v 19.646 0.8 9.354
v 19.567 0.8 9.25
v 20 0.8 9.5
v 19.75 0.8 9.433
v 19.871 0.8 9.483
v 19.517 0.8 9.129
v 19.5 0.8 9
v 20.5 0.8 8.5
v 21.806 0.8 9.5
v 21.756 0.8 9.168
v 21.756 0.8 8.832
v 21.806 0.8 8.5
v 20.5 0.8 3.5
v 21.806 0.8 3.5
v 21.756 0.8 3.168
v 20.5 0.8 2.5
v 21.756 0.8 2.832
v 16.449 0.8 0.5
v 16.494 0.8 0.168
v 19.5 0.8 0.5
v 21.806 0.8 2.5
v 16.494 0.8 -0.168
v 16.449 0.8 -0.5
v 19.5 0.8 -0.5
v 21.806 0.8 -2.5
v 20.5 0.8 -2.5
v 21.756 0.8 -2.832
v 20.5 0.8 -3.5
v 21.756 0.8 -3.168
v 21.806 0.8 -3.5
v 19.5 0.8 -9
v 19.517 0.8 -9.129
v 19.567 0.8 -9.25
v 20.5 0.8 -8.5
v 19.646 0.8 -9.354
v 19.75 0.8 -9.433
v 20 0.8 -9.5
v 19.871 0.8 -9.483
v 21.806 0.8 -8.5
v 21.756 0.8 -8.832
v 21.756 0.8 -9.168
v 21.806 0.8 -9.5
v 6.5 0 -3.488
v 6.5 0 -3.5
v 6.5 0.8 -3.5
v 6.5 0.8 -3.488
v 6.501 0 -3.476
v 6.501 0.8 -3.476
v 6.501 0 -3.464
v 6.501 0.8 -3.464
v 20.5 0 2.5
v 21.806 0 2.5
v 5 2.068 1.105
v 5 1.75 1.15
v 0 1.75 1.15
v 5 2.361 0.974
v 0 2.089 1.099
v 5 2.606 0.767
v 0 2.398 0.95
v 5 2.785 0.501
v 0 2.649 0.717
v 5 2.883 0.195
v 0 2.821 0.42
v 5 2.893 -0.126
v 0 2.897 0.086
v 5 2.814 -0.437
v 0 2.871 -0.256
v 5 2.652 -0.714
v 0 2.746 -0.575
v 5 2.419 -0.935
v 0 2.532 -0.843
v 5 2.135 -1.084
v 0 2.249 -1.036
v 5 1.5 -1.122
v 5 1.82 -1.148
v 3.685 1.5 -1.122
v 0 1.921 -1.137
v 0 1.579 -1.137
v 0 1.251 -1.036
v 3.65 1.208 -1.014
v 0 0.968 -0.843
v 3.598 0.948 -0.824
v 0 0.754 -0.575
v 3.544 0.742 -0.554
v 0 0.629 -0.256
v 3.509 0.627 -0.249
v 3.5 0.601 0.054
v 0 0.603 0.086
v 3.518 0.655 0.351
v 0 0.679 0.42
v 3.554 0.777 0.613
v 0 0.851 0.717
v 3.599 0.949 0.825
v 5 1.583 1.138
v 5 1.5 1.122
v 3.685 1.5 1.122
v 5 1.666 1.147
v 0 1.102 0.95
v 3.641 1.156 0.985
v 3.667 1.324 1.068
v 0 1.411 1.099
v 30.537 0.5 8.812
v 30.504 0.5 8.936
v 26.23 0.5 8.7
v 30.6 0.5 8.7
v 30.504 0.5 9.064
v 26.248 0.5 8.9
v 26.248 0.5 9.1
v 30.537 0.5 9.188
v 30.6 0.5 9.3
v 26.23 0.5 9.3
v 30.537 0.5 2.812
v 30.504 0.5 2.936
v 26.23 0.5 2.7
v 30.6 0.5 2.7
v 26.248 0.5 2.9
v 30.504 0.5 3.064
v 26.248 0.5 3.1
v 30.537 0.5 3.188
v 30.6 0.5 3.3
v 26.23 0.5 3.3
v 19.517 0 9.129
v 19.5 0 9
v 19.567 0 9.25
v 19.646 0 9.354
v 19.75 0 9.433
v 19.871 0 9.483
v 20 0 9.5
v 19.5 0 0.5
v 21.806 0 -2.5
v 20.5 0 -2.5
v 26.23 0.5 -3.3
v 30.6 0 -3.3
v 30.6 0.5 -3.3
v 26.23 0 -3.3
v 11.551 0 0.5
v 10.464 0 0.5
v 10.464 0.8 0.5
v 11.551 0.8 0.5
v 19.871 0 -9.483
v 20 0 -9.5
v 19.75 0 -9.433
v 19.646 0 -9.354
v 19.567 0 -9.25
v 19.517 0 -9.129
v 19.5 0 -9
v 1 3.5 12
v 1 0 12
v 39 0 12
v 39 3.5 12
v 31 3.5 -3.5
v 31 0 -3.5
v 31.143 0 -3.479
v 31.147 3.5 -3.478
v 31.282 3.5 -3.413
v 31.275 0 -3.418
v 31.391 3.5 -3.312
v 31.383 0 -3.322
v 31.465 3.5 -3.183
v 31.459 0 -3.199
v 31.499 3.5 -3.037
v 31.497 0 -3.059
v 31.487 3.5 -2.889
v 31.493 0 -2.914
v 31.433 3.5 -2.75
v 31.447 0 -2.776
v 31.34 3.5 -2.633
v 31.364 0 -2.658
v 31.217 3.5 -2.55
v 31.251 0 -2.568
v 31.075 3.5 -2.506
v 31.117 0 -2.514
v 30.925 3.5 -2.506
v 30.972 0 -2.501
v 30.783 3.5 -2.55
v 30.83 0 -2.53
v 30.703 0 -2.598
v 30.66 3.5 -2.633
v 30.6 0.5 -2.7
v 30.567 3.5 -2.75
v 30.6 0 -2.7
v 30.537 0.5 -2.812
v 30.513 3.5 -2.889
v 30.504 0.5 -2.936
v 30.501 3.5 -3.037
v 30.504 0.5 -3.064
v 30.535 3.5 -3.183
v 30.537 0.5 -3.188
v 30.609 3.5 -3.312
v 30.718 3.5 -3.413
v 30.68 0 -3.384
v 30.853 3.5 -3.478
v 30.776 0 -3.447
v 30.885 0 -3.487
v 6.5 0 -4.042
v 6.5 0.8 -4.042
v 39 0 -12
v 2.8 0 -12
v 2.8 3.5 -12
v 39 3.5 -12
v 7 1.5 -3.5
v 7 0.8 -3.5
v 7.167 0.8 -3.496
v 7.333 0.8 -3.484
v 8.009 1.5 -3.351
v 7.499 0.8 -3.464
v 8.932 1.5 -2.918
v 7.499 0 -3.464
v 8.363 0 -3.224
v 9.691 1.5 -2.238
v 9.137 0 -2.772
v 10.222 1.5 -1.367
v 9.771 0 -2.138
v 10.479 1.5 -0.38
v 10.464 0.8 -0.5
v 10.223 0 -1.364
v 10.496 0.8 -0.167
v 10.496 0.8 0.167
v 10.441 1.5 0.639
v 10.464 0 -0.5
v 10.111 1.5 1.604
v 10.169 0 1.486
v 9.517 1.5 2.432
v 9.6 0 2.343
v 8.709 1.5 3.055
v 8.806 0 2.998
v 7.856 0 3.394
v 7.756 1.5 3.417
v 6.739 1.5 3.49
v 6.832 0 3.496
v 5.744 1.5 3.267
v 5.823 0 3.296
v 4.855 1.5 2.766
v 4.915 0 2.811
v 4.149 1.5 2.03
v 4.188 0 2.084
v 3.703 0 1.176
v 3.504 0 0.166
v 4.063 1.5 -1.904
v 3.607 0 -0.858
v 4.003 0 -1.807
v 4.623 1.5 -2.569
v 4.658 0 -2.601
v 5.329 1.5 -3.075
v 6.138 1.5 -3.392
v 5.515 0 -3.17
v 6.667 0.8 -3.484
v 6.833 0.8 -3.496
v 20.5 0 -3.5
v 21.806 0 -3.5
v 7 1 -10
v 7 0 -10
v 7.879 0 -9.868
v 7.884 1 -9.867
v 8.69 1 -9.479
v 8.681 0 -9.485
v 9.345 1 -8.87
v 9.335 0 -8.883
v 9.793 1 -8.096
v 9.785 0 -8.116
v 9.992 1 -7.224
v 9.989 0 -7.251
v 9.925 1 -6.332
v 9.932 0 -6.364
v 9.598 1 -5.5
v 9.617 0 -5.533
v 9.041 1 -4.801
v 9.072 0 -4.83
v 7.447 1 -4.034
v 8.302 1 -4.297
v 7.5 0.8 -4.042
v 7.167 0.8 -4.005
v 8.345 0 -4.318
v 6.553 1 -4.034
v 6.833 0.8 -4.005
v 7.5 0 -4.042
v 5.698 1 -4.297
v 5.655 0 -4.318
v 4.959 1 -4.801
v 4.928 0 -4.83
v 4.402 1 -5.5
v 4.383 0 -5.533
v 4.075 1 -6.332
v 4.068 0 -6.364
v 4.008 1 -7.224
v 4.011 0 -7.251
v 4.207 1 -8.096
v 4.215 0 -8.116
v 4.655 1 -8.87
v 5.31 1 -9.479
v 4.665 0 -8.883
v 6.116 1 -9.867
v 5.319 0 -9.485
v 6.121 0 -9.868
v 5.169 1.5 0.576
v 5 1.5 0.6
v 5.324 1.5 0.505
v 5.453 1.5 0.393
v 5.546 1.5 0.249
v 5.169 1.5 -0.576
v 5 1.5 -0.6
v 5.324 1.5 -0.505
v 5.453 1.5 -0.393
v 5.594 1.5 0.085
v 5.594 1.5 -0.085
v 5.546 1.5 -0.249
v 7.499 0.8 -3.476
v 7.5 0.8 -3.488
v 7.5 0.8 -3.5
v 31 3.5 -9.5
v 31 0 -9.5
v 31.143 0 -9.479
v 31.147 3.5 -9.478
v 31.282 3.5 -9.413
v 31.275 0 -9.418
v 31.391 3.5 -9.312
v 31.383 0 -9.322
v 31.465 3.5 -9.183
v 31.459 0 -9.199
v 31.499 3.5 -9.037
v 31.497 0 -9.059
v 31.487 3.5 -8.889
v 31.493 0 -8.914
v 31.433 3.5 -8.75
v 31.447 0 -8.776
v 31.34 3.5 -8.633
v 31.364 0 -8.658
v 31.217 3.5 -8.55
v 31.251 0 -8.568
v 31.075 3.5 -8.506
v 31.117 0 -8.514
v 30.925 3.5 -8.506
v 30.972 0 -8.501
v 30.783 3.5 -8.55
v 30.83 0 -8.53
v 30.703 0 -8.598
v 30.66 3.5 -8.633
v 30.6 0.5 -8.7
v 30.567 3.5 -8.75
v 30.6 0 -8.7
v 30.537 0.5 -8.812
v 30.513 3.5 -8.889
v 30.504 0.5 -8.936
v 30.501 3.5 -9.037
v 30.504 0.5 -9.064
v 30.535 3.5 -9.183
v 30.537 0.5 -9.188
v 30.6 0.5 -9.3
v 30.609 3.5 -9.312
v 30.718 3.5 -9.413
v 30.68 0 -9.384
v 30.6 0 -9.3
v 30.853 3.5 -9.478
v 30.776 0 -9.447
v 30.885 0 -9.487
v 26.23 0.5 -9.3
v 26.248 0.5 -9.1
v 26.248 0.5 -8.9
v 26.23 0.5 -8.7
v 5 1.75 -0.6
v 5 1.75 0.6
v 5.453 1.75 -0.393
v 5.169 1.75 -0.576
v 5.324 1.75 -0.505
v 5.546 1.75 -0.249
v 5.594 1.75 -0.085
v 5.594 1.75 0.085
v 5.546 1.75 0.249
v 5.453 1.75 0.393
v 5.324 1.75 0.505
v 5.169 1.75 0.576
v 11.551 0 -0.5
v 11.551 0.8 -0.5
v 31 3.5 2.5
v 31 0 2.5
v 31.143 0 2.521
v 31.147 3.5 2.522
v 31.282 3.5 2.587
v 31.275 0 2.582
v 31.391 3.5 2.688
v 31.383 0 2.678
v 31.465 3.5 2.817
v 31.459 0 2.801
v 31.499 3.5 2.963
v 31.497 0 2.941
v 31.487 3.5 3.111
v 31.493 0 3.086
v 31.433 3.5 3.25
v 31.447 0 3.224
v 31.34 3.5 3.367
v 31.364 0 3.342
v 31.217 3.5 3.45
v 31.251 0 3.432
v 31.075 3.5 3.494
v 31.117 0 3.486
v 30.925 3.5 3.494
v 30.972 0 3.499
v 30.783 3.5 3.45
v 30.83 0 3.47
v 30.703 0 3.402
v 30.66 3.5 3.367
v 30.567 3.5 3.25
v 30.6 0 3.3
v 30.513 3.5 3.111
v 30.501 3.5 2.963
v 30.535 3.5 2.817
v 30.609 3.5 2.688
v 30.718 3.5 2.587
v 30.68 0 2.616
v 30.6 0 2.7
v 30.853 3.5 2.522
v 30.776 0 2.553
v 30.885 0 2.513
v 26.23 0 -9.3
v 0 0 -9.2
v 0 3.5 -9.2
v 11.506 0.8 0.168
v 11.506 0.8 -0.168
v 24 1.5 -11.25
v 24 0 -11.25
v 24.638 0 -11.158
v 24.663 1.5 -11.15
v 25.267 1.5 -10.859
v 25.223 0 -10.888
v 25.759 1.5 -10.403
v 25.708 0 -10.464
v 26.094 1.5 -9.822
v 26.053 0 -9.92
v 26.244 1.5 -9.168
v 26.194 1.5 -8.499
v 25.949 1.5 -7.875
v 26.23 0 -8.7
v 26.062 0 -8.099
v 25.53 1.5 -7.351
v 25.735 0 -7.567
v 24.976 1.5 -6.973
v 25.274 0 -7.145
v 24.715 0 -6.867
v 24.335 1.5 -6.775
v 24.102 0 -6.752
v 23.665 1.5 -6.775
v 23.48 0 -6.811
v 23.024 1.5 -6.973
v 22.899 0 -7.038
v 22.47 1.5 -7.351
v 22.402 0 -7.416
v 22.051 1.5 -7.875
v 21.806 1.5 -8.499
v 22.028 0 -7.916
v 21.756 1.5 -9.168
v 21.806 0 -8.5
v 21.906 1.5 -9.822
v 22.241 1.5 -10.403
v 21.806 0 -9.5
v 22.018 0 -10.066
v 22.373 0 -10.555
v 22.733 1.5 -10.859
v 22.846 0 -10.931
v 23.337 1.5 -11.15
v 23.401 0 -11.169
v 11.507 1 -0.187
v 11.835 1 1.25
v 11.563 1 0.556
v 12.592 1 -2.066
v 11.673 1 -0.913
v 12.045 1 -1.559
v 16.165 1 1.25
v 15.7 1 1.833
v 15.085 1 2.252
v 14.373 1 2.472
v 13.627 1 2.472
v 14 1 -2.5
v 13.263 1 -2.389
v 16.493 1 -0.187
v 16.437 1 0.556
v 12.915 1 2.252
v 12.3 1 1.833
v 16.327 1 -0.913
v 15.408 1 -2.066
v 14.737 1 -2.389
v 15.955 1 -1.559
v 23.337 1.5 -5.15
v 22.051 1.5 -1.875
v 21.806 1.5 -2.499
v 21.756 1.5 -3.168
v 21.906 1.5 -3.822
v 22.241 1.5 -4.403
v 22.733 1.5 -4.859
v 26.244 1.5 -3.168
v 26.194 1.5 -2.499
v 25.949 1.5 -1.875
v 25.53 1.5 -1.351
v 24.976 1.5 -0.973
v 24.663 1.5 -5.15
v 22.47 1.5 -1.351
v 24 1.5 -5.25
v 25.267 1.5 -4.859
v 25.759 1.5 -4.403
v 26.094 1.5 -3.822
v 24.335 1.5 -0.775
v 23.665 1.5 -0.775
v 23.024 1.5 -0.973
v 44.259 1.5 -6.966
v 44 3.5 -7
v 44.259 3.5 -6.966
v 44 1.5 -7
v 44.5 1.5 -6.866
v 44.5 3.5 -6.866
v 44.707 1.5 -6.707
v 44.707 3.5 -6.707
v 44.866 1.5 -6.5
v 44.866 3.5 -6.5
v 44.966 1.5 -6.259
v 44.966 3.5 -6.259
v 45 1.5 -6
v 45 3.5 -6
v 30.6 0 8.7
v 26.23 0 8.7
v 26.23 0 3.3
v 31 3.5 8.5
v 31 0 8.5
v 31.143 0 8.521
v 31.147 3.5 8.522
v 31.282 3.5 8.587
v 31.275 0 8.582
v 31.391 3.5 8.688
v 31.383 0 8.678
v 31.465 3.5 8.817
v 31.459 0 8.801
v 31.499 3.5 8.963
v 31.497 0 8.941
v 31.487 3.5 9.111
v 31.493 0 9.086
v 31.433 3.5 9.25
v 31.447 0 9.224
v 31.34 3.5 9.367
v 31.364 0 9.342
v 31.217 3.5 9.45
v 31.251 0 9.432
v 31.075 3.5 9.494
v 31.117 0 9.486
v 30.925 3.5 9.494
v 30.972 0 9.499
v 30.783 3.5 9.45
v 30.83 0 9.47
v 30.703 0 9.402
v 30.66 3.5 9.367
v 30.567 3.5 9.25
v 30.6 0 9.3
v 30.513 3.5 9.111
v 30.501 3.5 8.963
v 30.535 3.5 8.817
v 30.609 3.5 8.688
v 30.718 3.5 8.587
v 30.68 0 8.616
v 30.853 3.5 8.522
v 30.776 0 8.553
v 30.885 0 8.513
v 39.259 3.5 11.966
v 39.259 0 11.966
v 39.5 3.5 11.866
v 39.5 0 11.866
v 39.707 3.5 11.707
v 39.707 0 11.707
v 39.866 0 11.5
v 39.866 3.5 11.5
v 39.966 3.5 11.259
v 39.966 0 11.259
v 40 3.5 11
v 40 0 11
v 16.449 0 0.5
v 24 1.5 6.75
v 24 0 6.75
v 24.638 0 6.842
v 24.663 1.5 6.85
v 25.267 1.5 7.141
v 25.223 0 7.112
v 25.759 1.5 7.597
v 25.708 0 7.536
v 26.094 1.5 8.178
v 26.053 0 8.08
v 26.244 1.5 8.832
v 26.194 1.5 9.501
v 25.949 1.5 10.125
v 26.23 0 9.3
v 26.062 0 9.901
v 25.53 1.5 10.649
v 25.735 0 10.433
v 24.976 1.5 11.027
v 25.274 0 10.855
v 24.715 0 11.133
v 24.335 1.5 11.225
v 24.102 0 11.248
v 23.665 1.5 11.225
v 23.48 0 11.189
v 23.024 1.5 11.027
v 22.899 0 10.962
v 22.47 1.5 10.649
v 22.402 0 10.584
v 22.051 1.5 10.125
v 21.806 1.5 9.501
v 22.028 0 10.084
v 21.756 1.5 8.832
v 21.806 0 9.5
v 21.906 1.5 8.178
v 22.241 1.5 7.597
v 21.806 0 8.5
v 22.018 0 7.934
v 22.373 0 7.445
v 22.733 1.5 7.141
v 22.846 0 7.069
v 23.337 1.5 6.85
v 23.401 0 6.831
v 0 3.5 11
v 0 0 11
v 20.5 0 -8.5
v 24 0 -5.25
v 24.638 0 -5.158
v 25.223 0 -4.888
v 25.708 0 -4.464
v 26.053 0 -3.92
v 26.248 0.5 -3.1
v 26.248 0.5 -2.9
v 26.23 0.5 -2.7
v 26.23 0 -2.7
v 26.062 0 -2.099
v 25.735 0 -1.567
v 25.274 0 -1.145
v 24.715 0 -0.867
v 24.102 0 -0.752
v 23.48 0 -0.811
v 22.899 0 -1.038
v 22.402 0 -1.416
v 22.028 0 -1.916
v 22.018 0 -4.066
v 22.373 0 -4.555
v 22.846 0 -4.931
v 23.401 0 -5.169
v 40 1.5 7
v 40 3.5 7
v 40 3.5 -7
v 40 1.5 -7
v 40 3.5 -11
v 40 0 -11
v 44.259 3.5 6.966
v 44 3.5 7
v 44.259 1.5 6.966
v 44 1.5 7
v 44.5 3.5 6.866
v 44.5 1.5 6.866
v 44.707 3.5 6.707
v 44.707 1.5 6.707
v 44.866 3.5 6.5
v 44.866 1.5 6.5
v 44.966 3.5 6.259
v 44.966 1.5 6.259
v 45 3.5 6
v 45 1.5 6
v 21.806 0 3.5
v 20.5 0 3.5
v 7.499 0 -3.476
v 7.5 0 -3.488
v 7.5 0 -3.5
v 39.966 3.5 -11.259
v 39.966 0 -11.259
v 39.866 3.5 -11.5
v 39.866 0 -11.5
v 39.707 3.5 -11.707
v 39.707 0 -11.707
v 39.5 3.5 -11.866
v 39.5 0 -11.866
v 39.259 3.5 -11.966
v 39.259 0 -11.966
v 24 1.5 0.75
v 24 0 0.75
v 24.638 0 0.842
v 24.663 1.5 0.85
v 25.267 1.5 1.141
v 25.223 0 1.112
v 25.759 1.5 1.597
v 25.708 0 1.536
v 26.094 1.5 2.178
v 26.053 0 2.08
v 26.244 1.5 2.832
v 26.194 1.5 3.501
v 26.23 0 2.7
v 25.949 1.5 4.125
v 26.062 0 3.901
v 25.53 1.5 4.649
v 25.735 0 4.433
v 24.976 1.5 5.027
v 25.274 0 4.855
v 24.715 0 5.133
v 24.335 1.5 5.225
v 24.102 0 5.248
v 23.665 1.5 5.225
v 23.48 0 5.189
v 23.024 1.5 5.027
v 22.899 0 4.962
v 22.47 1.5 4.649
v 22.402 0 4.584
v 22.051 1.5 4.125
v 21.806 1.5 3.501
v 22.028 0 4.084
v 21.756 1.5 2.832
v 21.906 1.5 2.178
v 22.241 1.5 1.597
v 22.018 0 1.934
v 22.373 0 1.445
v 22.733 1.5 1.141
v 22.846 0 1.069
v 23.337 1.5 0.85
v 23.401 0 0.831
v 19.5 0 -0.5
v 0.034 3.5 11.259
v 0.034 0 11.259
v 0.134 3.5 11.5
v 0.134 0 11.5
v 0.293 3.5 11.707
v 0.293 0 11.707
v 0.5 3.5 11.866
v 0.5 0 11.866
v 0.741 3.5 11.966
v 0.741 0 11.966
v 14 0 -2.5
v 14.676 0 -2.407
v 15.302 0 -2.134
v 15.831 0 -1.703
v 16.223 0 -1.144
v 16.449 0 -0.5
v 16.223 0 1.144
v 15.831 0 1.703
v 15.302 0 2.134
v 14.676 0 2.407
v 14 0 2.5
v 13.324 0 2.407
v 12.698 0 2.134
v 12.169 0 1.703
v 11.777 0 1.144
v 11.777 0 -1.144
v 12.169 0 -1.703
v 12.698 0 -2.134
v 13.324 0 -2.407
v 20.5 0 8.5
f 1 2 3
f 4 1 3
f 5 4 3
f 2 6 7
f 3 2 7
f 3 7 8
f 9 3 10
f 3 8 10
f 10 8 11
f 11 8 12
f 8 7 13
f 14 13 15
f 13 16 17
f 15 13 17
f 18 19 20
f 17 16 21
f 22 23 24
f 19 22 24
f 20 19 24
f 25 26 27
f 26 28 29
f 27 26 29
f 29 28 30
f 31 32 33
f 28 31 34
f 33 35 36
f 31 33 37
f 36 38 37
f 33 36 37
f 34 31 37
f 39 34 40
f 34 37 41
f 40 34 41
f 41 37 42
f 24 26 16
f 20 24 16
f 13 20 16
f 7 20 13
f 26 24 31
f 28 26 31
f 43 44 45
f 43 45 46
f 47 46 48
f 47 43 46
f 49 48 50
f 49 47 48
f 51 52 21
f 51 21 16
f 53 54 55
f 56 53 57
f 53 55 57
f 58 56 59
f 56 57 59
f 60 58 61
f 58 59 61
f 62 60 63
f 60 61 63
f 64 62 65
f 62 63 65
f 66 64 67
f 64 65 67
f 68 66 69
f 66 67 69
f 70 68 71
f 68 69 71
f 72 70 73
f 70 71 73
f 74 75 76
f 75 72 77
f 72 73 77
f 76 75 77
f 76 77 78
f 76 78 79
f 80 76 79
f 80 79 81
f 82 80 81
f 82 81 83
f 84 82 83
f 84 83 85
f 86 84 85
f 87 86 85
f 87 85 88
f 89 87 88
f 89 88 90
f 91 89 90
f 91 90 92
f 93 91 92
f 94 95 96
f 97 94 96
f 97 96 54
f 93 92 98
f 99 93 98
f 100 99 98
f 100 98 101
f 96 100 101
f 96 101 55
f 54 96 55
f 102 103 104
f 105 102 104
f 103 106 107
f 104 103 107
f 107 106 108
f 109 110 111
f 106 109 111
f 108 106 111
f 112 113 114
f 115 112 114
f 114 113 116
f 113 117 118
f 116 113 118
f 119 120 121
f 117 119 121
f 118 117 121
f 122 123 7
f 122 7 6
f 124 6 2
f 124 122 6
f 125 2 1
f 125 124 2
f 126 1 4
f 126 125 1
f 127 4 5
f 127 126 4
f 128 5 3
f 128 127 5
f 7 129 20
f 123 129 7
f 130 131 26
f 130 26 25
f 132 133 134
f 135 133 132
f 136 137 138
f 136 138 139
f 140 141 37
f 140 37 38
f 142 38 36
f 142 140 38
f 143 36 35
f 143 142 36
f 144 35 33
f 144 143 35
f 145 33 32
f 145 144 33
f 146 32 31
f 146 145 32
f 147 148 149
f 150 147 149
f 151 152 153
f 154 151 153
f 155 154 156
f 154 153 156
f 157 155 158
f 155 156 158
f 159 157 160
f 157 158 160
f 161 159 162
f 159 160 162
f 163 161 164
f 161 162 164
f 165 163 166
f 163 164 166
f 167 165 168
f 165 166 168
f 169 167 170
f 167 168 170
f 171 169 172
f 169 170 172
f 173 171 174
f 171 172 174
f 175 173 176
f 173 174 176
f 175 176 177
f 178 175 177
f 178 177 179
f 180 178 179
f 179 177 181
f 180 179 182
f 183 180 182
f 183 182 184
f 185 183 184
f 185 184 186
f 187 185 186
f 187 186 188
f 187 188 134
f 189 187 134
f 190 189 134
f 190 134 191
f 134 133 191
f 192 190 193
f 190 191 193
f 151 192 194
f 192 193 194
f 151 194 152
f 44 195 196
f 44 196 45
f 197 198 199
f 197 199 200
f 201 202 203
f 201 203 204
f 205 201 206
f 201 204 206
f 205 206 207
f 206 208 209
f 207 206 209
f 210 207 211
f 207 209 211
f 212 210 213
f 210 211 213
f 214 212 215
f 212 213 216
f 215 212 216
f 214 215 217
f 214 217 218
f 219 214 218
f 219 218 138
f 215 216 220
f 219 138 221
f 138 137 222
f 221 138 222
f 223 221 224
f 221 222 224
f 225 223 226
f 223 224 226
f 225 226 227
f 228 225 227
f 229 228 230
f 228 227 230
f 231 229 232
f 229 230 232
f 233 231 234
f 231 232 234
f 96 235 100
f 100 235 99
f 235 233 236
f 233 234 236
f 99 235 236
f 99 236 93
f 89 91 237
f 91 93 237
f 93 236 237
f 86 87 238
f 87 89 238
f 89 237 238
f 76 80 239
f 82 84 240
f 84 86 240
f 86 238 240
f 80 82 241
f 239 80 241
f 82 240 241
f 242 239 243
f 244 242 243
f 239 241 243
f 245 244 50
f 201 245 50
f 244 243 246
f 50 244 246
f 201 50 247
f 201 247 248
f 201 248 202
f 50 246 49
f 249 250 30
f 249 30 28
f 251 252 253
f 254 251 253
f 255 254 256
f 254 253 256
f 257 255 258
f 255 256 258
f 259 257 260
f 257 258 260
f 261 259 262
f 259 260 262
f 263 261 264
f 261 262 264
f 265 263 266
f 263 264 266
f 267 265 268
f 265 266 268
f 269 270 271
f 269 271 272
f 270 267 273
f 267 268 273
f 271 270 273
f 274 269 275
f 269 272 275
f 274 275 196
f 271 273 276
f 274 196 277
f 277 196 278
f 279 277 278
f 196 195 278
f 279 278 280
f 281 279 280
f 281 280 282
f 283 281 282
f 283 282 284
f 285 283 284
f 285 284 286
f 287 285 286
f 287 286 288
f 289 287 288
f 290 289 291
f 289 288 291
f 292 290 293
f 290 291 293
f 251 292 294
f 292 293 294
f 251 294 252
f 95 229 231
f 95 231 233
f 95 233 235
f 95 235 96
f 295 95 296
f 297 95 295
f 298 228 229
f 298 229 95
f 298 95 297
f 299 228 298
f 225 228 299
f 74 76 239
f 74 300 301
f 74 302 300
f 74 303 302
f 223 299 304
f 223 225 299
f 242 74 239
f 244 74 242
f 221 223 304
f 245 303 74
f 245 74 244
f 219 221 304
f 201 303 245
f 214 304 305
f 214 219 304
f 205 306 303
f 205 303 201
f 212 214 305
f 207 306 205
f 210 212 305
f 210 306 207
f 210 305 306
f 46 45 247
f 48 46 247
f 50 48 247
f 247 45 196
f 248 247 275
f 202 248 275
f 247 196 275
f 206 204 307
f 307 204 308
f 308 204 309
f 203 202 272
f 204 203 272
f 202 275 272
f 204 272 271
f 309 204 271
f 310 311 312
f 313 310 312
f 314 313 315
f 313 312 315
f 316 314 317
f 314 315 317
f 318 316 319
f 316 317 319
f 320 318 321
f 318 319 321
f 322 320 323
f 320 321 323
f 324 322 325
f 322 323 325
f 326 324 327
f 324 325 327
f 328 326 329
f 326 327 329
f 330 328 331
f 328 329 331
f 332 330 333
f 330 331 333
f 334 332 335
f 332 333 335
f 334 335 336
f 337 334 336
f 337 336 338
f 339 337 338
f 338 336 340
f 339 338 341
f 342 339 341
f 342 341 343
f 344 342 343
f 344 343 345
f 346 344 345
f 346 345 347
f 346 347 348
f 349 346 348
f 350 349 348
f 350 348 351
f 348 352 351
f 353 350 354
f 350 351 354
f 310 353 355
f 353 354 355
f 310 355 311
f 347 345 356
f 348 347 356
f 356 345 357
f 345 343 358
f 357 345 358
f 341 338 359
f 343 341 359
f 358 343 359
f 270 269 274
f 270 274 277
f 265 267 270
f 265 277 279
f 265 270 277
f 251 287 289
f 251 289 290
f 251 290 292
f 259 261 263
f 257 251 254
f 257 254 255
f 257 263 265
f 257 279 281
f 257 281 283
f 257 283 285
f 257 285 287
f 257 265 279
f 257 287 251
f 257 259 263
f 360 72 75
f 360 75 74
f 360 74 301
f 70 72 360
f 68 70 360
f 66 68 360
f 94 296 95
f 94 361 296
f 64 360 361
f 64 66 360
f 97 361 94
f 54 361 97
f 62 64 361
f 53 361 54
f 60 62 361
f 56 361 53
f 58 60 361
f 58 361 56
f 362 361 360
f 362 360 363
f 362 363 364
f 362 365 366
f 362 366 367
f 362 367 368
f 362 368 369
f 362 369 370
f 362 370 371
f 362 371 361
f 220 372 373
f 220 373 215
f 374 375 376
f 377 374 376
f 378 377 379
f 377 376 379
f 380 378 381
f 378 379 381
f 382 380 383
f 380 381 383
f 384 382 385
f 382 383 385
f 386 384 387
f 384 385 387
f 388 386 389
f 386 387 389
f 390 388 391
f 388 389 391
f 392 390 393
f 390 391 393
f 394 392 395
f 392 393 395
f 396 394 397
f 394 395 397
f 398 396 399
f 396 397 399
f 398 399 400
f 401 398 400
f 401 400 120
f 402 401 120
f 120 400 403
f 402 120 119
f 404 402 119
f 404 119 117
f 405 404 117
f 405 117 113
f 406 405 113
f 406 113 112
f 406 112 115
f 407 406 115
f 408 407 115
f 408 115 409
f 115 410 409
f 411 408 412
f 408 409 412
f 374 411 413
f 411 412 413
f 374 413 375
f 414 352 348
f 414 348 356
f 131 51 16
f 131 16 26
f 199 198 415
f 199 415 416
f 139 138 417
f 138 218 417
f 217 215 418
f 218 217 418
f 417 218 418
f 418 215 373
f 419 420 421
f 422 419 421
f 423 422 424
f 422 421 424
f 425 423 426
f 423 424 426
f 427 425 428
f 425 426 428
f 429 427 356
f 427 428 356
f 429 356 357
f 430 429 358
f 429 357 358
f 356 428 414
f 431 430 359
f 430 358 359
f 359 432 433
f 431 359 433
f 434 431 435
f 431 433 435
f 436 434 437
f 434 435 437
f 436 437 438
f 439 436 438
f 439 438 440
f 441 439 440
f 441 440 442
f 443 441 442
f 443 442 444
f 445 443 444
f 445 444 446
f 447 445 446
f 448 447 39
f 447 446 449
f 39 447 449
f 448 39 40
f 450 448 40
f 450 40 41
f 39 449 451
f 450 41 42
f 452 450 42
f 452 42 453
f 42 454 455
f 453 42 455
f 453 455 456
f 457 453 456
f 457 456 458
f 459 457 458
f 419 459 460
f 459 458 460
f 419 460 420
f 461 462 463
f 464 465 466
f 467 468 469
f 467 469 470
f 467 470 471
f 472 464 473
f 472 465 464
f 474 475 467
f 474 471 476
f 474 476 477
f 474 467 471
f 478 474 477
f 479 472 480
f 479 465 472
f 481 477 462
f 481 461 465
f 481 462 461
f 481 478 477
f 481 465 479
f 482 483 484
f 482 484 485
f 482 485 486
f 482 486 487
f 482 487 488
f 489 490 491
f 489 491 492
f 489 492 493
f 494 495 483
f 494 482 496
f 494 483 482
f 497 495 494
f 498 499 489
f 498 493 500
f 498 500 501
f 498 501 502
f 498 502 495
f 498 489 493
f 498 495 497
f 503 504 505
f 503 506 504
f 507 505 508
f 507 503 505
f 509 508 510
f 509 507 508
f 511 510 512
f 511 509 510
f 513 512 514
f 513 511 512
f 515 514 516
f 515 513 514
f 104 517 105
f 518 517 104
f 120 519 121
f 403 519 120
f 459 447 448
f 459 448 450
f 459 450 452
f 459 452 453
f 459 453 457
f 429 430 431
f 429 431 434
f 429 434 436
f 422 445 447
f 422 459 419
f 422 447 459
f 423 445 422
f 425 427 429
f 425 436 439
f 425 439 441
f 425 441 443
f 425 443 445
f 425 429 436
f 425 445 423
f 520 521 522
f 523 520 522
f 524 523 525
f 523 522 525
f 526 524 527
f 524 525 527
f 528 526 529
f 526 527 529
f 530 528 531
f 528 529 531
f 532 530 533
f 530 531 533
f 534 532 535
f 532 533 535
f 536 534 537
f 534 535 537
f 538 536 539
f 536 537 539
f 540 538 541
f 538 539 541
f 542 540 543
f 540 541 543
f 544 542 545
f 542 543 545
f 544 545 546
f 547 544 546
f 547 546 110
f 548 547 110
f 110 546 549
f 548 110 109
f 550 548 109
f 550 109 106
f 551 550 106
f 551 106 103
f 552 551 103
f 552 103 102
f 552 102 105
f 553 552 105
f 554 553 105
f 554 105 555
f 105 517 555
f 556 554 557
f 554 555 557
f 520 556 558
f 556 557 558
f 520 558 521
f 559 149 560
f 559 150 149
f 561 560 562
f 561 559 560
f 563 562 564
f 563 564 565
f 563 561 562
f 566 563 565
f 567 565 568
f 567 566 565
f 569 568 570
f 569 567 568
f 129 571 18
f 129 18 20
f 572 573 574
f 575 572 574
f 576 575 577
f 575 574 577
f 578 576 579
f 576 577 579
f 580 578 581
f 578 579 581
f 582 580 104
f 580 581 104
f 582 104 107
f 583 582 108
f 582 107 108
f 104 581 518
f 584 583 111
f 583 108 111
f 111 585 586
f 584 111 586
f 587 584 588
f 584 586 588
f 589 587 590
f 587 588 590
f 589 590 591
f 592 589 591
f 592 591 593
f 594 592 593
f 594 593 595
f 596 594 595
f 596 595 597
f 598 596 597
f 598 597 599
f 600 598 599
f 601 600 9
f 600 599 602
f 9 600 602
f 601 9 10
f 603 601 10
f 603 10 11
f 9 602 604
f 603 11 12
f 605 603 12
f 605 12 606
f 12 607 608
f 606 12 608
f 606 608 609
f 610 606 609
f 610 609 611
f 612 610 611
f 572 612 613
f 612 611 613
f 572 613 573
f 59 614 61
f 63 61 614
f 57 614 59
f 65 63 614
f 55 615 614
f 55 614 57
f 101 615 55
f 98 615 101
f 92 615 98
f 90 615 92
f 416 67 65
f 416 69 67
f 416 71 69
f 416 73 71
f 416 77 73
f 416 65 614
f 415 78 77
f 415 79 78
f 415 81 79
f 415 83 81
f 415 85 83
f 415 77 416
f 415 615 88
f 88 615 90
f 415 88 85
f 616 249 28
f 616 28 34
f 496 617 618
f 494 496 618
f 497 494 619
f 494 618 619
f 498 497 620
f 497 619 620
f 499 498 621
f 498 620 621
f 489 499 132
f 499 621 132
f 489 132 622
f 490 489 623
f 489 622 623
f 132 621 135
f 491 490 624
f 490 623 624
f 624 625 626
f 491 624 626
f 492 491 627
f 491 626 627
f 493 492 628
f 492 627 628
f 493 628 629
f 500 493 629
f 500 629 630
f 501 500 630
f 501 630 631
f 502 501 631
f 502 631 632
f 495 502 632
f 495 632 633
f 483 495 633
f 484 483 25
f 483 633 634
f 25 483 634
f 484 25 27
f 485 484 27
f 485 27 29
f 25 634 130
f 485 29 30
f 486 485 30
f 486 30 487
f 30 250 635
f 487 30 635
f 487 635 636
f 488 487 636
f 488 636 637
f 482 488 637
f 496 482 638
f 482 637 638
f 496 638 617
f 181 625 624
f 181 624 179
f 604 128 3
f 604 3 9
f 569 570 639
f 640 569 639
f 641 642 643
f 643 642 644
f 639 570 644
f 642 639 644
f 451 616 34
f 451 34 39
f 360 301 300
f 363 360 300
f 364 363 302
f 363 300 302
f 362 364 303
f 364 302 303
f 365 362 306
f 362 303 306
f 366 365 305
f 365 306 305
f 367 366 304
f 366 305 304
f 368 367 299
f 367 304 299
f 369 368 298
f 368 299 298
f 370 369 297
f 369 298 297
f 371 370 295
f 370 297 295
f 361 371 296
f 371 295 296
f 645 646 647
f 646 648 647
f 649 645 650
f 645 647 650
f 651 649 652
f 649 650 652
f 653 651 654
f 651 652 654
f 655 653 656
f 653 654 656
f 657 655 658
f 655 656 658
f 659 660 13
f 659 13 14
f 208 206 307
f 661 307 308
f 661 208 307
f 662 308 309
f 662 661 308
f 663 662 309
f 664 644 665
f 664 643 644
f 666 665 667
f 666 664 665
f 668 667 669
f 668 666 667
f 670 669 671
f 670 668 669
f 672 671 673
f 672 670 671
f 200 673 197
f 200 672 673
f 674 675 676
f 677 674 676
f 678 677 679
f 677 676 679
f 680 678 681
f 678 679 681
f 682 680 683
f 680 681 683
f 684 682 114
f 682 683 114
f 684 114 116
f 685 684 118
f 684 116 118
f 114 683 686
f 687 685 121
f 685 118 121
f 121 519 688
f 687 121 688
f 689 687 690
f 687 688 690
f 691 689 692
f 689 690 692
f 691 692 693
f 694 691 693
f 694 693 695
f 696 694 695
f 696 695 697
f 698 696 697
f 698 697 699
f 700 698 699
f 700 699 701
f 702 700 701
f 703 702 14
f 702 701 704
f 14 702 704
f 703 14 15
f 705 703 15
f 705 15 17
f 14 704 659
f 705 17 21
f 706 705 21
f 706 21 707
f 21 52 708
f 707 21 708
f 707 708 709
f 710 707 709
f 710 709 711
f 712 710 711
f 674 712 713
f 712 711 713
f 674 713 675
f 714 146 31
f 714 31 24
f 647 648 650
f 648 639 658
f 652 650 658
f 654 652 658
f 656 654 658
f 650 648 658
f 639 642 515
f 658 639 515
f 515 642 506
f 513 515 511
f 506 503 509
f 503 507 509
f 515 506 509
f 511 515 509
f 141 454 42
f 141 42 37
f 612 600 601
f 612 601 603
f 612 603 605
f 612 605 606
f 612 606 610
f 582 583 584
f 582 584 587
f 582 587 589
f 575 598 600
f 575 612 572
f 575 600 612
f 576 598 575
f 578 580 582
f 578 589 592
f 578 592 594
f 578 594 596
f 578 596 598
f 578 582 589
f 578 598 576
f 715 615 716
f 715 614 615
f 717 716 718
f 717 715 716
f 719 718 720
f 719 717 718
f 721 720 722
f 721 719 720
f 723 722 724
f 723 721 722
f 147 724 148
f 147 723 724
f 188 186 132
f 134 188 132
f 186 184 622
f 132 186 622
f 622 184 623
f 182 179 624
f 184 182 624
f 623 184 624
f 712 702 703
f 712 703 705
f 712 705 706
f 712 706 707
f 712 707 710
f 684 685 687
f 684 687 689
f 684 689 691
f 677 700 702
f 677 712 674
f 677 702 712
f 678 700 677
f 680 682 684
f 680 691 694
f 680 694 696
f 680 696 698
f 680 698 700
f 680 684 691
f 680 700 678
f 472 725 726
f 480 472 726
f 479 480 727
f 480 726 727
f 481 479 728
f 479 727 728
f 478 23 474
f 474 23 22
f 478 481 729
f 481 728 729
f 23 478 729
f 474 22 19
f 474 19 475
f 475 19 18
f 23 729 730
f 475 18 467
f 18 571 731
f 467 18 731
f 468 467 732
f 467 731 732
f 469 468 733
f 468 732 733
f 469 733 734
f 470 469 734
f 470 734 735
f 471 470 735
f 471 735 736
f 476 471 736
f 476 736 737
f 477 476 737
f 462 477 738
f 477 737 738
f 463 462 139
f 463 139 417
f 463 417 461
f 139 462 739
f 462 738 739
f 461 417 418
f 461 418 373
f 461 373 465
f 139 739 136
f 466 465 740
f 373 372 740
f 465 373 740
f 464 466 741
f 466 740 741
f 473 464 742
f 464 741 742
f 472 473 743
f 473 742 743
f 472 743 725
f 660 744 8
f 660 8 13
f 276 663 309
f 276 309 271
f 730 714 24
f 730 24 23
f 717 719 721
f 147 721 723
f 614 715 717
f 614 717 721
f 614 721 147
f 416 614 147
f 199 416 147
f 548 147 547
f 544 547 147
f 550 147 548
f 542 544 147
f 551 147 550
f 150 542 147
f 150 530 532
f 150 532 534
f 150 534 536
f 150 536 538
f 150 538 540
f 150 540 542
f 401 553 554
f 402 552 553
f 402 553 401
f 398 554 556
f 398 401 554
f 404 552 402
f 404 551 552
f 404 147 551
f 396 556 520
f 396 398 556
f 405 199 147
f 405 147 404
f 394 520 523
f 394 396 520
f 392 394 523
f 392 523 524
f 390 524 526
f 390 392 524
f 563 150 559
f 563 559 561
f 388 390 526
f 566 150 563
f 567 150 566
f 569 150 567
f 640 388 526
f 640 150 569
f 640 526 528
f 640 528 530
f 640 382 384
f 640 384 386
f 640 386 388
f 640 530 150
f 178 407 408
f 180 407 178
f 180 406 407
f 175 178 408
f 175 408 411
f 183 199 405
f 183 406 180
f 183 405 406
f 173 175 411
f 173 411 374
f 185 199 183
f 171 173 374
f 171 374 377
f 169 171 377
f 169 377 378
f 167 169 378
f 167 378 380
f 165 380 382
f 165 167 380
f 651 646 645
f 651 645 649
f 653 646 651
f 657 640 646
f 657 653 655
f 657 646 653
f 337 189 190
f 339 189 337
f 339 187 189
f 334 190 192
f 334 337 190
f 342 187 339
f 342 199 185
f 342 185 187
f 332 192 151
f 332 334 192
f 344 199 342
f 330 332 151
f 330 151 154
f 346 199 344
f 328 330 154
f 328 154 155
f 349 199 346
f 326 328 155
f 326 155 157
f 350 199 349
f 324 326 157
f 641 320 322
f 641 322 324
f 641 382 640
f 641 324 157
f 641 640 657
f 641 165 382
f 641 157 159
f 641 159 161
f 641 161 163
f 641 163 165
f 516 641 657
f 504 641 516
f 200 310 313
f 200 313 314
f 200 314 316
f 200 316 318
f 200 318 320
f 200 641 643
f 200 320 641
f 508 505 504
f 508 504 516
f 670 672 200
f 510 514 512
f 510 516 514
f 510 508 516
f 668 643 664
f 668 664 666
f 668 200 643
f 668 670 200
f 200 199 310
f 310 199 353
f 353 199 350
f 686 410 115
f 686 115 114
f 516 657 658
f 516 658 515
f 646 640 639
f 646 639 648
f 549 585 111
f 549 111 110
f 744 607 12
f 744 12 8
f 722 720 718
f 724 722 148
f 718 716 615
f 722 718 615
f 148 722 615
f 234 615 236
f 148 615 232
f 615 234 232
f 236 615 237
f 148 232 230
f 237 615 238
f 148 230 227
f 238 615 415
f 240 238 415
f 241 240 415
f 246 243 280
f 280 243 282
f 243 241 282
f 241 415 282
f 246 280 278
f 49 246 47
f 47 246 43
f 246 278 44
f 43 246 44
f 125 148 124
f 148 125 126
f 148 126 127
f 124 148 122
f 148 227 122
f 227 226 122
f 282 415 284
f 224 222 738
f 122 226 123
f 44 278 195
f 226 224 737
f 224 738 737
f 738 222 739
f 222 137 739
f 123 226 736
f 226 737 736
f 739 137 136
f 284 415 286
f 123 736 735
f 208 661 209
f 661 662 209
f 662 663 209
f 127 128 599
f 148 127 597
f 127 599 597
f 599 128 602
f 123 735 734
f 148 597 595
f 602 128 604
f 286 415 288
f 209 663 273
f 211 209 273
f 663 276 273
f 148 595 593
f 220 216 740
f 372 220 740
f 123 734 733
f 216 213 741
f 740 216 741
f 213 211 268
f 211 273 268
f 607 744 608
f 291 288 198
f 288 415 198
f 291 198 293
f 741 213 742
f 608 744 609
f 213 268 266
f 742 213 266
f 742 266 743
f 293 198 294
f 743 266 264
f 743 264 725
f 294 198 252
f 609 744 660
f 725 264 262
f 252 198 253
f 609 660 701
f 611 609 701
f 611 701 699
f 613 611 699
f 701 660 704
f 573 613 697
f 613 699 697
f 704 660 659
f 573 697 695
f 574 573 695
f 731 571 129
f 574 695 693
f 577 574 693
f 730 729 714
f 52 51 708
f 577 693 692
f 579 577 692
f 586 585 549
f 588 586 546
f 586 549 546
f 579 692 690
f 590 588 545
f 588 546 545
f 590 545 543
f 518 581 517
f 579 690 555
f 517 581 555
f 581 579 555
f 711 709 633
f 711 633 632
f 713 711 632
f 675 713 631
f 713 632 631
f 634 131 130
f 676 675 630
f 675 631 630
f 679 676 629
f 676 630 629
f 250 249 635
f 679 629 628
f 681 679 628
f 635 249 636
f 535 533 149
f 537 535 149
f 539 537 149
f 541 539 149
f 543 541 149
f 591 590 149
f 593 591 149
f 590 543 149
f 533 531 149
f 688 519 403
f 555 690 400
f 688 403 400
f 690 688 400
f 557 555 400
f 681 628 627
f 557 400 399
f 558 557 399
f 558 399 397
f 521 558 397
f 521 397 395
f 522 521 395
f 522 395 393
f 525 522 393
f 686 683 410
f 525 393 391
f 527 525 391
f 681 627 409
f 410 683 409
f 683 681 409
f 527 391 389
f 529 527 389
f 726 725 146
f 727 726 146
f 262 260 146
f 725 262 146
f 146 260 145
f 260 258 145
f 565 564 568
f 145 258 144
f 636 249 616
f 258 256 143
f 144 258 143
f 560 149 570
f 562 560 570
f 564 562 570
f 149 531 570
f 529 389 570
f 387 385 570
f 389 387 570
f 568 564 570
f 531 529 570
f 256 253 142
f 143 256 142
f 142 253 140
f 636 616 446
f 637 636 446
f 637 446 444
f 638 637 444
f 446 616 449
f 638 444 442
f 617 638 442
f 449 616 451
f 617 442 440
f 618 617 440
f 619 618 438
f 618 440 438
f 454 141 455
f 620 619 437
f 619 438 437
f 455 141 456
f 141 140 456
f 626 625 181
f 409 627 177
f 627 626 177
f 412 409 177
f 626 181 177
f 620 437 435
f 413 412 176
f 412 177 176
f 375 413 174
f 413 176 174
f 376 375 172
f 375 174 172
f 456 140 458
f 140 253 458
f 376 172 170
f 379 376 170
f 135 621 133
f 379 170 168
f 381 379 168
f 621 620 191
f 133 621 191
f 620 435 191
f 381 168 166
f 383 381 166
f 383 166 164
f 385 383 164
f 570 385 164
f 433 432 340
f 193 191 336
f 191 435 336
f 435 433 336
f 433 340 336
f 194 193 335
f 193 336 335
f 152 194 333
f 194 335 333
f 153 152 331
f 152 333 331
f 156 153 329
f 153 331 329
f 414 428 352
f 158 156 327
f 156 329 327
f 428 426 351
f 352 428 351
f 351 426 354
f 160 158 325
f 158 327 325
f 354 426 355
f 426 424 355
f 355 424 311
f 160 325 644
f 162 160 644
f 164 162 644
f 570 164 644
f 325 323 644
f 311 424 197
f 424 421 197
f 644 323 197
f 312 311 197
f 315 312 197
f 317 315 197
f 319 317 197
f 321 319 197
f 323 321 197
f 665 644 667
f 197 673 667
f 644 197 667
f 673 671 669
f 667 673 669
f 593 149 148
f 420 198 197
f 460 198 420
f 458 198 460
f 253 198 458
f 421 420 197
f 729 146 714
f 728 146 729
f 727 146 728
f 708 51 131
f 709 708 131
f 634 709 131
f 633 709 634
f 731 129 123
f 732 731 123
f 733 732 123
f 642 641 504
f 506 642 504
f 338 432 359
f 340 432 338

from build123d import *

# Parameters (mm, degrees)
SKETCH4_W           = 40
SKETCH4_H           = 24
BOSS_EXTRUDE2_DEPTH = 3.5
FILLET2_R           = 1
SKETCH5_W           = 4.999999906
SKETCH5_H           = 14
BOSS_EXTRUDE3_DEPTH = 2
FILLET3_R           = 1
CHAMFER1_SIZE       = 2.8
SKETCH6_R           = 1.15
CUT_EXTRUDE1_DEPTH  = 5
SKETCH8_R           = 0.6
CUT_EXTRUDE2_DEPTH  = 1.75
SKETCH9_R           = 3.5
CUT_EXTRUDE3_DEPTH  = 1.5
SKETCH10_R          = 3
CUT_EXTRUDE4_DEPTH  = 1
CUT_EXTRUDE5_DEPTH  = 0.8
SKETCH12_R          = 2.5
CUT_EXTRUDE6_DEPTH  = 1
CUT_EXTRUDE7_DEPTH  = 0.8
CUT_EXTRUDE8_DEPTH  = 0.8
SKETCH16_R          = 2.25
CUT_EXTRUDE9_DEPTH  = 1.5
CUT_EXTRUDE10_DEPTH = 0.5
SKETCH18_R          = 0.5
CUT_EXTRUDE11_DEPTH = 47.70385414
LPATTERN3_COUNT     = 4
LPATTERN3_PITCH     = 6


with BuildPart() as part:
    # Sketch4 → Boss-Extrude2 (new body)
    with BuildSketch(Plane(origin=(0, 0, 0), x_dir=(1, 0, 0), z_dir=(0, 1, 0))):
        with Locations((20, 0)):
            Rectangle(SKETCH4_W, SKETCH4_H)
    extrude(amount=BOSS_EXTRUDE2_DEPTH)

    # Fillet2
    fillet2_edges = [part.edges().sort_by_distance(p)[0] for p in [
        (40, 1.75, -12),
        (40, 1.75, 12),
        (0, 1.75, 12),
    ]]
    fillet(fillet2_edges, radius=FILLET2_R)

    # Sketch5 → Boss-Extrude3 (add)
    with BuildSketch(Plane(origin=(0, 3.5, 0), x_dir=(1, 0, 0), z_dir=(0, 1, 0))):
        with Locations((42.499999953, 0)):
            Rectangle(SKETCH5_W, SKETCH5_H)
    extrude(amount=-BOSS_EXTRUDE3_DEPTH)

    # Fillet3
    fillet3_edges = [part.edges().sort_by_distance(p)[0] for p in [
        (44.999999906, 2.5, -7),
        (44.999999906, 2.5, 7),
    ]]
    fillet(fillet3_edges, radius=FILLET3_R)

    # Chamfer1
    chamfer1_edges = [part.edges().sort_by_distance(p)[0] for p in [
        (0, 1.75, -12),
    ]]
    chamfer(chamfer1_edges, length=CHAMFER1_SIZE)

    # Sketch6 → Cut-Extrude1 (cut)
    with BuildSketch(Plane.ZY):
        with Locations((0, 1.75)):
            Circle(SKETCH6_R)
    extrude(amount=-CUT_EXTRUDE1_DEPTH, mode=Mode.SUBTRACT)

    # Sketch8 → Cut-Extrude2 (cut)
    with BuildSketch(Plane.XZ):
        with Locations(Location((5, 0, 0), (0, 0, 270))):
            Circle(SKETCH8_R)
    extrude(amount=-CUT_EXTRUDE2_DEPTH, mode=Mode.SUBTRACT)

    # Sketch9 → Cut-Extrude3 (cut)
    with BuildSketch(Plane.XZ):
        with Locations(Location((7, 0, 0), (0, 0, 270))):
            Circle(SKETCH9_R)
    extrude(amount=-CUT_EXTRUDE3_DEPTH, mode=Mode.SUBTRACT)

    # Sketch10 → Cut-Extrude4 (cut)
    with BuildSketch(Plane.XZ):
        with Locations(Location((7, -7, 0), (0, 0, 270))):
            Circle(SKETCH10_R)
    extrude(amount=-CUT_EXTRUDE4_DEPTH, mode=Mode.SUBTRACT)

    # Sketch11 → Cut-Extrude5 (cut)
    with BuildSketch(Plane(origin=(0, 0, 0), x_dir=(-1, 0, 0), z_dir=(0, -1, 0))):
        with BuildLine():
            Line((-6.5, 7), (-6.5, 3.5))
            ThreePointArc((-6.5, 3.5), (-7, 3), (-7.5, 3.5))
            Line((-7.5, 3.5), (-7.5, 7))
            ThreePointArc((-7.5, 7), (-7, 7.5), (-6.5, 7))
        make_face()
        with BuildLine():
            Line((-20, 0.5), (-7, 0.5))
            ThreePointArc((-7, 0.5), (-6.5, 0), (-7, -0.5))
            Line((-7, -0.5), (-20, -0.5))
            ThreePointArc((-20, -0.5), (-20.5, 0), (-20, 0.5))
        make_face()
    extrude(amount=-CUT_EXTRUDE5_DEPTH, mode=Mode.SUBTRACT)

    # Sketch12 → Cut-Extrude6 (cut)
    with BuildSketch(Plane.XZ):
        with Locations(Location((14, 0, 0), (0, 0, 270))):
            Circle(SKETCH12_R)
    extrude(amount=-CUT_EXTRUDE6_DEPTH, mode=Mode.SUBTRACT)

    # Sketch14 → Cut-Extrude7 (cut)
    with BuildSketch(Plane.XZ):
        with BuildLine():
            Line((19.5, -9), (19.5, 9))
            ThreePointArc((19.5, 9), (20, 9.5), (20.5, 9))
            Line((20.5, 9), (20.5, -9))
            ThreePointArc((20.5, -9), (20, -9.5), (19.5, -9))
        make_face()
    extrude(amount=-CUT_EXTRUDE7_DEPTH, mode=Mode.SUBTRACT)

    # Sketch15 → Cut-Extrude8 (cut)
    with BuildSketch(Plane.XZ):
        with BuildLine():
            Line((20, -8.5), (24, -8.5))
            ThreePointArc((24, -8.5), (24.5, -9), (24, -9.5))
            Line((24, -9.5), (20, -9.5))
            ThreePointArc((20, -9.5), (19.5, -9), (20, -8.5))
        make_face()
    cut_extrude8 = extrude(amount=-CUT_EXTRUDE8_DEPTH, mode=Mode.SUBTRACT)

    # Sketch16 → Cut-Extrude9 (cut)
    with BuildSketch(Plane.XZ):
        with Locations(Location((24, -9, 0), (0, 0, 270))):
            Circle(SKETCH16_R)
    cut_extrude9 = extrude(amount=-CUT_EXTRUDE9_DEPTH, mode=Mode.SUBTRACT)

    # Sketch17 → Cut-Extrude10 (cut)
    with BuildSketch(Plane.XZ):
        with BuildLine():
            Line((31, -9.3), (24, -9.3))
            ThreePointArc((24, -9.3), (23.7, -9), (24, -8.7))
            Line((24, -8.7), (31, -8.7))
            ThreePointArc((31, -8.7), (31.3, -9), (31, -9.3))
        make_face()
    cut_extrude10 = extrude(amount=-CUT_EXTRUDE10_DEPTH, mode=Mode.SUBTRACT)

    # Sketch18 → Cut-Extrude11 (cut, through all)
    with BuildSketch(Plane(origin=(0, 0, 0), x_dir=(-1, 0, 0), z_dir=(0, -1, 0))):
        with Locations(Location((-31, 9, 0), (0, 0, 90))):
            Circle(SKETCH18_R)
    cut_extrude11 = extrude(amount=-CUT_EXTRUDE11_DEPTH, mode=Mode.SUBTRACT)

    # LPattern3: Cut-Extrude8, Cut-Extrude9, Cut-Extrude10, Cut-Extrude11 ×4
    with Locations(*[(0, 0, i * LPATTERN3_PITCH) for i in range(1, LPATTERN3_COUNT)]):
        add(cut_extrude8, mode=Mode.SUBTRACT)
        add(cut_extrude9, mode=Mode.SUBTRACT)
        add(cut_extrude10, mode=Mode.SUBTRACT)
        add(cut_extrude11, mode=Mode.SUBTRACT)


solid = part.part
